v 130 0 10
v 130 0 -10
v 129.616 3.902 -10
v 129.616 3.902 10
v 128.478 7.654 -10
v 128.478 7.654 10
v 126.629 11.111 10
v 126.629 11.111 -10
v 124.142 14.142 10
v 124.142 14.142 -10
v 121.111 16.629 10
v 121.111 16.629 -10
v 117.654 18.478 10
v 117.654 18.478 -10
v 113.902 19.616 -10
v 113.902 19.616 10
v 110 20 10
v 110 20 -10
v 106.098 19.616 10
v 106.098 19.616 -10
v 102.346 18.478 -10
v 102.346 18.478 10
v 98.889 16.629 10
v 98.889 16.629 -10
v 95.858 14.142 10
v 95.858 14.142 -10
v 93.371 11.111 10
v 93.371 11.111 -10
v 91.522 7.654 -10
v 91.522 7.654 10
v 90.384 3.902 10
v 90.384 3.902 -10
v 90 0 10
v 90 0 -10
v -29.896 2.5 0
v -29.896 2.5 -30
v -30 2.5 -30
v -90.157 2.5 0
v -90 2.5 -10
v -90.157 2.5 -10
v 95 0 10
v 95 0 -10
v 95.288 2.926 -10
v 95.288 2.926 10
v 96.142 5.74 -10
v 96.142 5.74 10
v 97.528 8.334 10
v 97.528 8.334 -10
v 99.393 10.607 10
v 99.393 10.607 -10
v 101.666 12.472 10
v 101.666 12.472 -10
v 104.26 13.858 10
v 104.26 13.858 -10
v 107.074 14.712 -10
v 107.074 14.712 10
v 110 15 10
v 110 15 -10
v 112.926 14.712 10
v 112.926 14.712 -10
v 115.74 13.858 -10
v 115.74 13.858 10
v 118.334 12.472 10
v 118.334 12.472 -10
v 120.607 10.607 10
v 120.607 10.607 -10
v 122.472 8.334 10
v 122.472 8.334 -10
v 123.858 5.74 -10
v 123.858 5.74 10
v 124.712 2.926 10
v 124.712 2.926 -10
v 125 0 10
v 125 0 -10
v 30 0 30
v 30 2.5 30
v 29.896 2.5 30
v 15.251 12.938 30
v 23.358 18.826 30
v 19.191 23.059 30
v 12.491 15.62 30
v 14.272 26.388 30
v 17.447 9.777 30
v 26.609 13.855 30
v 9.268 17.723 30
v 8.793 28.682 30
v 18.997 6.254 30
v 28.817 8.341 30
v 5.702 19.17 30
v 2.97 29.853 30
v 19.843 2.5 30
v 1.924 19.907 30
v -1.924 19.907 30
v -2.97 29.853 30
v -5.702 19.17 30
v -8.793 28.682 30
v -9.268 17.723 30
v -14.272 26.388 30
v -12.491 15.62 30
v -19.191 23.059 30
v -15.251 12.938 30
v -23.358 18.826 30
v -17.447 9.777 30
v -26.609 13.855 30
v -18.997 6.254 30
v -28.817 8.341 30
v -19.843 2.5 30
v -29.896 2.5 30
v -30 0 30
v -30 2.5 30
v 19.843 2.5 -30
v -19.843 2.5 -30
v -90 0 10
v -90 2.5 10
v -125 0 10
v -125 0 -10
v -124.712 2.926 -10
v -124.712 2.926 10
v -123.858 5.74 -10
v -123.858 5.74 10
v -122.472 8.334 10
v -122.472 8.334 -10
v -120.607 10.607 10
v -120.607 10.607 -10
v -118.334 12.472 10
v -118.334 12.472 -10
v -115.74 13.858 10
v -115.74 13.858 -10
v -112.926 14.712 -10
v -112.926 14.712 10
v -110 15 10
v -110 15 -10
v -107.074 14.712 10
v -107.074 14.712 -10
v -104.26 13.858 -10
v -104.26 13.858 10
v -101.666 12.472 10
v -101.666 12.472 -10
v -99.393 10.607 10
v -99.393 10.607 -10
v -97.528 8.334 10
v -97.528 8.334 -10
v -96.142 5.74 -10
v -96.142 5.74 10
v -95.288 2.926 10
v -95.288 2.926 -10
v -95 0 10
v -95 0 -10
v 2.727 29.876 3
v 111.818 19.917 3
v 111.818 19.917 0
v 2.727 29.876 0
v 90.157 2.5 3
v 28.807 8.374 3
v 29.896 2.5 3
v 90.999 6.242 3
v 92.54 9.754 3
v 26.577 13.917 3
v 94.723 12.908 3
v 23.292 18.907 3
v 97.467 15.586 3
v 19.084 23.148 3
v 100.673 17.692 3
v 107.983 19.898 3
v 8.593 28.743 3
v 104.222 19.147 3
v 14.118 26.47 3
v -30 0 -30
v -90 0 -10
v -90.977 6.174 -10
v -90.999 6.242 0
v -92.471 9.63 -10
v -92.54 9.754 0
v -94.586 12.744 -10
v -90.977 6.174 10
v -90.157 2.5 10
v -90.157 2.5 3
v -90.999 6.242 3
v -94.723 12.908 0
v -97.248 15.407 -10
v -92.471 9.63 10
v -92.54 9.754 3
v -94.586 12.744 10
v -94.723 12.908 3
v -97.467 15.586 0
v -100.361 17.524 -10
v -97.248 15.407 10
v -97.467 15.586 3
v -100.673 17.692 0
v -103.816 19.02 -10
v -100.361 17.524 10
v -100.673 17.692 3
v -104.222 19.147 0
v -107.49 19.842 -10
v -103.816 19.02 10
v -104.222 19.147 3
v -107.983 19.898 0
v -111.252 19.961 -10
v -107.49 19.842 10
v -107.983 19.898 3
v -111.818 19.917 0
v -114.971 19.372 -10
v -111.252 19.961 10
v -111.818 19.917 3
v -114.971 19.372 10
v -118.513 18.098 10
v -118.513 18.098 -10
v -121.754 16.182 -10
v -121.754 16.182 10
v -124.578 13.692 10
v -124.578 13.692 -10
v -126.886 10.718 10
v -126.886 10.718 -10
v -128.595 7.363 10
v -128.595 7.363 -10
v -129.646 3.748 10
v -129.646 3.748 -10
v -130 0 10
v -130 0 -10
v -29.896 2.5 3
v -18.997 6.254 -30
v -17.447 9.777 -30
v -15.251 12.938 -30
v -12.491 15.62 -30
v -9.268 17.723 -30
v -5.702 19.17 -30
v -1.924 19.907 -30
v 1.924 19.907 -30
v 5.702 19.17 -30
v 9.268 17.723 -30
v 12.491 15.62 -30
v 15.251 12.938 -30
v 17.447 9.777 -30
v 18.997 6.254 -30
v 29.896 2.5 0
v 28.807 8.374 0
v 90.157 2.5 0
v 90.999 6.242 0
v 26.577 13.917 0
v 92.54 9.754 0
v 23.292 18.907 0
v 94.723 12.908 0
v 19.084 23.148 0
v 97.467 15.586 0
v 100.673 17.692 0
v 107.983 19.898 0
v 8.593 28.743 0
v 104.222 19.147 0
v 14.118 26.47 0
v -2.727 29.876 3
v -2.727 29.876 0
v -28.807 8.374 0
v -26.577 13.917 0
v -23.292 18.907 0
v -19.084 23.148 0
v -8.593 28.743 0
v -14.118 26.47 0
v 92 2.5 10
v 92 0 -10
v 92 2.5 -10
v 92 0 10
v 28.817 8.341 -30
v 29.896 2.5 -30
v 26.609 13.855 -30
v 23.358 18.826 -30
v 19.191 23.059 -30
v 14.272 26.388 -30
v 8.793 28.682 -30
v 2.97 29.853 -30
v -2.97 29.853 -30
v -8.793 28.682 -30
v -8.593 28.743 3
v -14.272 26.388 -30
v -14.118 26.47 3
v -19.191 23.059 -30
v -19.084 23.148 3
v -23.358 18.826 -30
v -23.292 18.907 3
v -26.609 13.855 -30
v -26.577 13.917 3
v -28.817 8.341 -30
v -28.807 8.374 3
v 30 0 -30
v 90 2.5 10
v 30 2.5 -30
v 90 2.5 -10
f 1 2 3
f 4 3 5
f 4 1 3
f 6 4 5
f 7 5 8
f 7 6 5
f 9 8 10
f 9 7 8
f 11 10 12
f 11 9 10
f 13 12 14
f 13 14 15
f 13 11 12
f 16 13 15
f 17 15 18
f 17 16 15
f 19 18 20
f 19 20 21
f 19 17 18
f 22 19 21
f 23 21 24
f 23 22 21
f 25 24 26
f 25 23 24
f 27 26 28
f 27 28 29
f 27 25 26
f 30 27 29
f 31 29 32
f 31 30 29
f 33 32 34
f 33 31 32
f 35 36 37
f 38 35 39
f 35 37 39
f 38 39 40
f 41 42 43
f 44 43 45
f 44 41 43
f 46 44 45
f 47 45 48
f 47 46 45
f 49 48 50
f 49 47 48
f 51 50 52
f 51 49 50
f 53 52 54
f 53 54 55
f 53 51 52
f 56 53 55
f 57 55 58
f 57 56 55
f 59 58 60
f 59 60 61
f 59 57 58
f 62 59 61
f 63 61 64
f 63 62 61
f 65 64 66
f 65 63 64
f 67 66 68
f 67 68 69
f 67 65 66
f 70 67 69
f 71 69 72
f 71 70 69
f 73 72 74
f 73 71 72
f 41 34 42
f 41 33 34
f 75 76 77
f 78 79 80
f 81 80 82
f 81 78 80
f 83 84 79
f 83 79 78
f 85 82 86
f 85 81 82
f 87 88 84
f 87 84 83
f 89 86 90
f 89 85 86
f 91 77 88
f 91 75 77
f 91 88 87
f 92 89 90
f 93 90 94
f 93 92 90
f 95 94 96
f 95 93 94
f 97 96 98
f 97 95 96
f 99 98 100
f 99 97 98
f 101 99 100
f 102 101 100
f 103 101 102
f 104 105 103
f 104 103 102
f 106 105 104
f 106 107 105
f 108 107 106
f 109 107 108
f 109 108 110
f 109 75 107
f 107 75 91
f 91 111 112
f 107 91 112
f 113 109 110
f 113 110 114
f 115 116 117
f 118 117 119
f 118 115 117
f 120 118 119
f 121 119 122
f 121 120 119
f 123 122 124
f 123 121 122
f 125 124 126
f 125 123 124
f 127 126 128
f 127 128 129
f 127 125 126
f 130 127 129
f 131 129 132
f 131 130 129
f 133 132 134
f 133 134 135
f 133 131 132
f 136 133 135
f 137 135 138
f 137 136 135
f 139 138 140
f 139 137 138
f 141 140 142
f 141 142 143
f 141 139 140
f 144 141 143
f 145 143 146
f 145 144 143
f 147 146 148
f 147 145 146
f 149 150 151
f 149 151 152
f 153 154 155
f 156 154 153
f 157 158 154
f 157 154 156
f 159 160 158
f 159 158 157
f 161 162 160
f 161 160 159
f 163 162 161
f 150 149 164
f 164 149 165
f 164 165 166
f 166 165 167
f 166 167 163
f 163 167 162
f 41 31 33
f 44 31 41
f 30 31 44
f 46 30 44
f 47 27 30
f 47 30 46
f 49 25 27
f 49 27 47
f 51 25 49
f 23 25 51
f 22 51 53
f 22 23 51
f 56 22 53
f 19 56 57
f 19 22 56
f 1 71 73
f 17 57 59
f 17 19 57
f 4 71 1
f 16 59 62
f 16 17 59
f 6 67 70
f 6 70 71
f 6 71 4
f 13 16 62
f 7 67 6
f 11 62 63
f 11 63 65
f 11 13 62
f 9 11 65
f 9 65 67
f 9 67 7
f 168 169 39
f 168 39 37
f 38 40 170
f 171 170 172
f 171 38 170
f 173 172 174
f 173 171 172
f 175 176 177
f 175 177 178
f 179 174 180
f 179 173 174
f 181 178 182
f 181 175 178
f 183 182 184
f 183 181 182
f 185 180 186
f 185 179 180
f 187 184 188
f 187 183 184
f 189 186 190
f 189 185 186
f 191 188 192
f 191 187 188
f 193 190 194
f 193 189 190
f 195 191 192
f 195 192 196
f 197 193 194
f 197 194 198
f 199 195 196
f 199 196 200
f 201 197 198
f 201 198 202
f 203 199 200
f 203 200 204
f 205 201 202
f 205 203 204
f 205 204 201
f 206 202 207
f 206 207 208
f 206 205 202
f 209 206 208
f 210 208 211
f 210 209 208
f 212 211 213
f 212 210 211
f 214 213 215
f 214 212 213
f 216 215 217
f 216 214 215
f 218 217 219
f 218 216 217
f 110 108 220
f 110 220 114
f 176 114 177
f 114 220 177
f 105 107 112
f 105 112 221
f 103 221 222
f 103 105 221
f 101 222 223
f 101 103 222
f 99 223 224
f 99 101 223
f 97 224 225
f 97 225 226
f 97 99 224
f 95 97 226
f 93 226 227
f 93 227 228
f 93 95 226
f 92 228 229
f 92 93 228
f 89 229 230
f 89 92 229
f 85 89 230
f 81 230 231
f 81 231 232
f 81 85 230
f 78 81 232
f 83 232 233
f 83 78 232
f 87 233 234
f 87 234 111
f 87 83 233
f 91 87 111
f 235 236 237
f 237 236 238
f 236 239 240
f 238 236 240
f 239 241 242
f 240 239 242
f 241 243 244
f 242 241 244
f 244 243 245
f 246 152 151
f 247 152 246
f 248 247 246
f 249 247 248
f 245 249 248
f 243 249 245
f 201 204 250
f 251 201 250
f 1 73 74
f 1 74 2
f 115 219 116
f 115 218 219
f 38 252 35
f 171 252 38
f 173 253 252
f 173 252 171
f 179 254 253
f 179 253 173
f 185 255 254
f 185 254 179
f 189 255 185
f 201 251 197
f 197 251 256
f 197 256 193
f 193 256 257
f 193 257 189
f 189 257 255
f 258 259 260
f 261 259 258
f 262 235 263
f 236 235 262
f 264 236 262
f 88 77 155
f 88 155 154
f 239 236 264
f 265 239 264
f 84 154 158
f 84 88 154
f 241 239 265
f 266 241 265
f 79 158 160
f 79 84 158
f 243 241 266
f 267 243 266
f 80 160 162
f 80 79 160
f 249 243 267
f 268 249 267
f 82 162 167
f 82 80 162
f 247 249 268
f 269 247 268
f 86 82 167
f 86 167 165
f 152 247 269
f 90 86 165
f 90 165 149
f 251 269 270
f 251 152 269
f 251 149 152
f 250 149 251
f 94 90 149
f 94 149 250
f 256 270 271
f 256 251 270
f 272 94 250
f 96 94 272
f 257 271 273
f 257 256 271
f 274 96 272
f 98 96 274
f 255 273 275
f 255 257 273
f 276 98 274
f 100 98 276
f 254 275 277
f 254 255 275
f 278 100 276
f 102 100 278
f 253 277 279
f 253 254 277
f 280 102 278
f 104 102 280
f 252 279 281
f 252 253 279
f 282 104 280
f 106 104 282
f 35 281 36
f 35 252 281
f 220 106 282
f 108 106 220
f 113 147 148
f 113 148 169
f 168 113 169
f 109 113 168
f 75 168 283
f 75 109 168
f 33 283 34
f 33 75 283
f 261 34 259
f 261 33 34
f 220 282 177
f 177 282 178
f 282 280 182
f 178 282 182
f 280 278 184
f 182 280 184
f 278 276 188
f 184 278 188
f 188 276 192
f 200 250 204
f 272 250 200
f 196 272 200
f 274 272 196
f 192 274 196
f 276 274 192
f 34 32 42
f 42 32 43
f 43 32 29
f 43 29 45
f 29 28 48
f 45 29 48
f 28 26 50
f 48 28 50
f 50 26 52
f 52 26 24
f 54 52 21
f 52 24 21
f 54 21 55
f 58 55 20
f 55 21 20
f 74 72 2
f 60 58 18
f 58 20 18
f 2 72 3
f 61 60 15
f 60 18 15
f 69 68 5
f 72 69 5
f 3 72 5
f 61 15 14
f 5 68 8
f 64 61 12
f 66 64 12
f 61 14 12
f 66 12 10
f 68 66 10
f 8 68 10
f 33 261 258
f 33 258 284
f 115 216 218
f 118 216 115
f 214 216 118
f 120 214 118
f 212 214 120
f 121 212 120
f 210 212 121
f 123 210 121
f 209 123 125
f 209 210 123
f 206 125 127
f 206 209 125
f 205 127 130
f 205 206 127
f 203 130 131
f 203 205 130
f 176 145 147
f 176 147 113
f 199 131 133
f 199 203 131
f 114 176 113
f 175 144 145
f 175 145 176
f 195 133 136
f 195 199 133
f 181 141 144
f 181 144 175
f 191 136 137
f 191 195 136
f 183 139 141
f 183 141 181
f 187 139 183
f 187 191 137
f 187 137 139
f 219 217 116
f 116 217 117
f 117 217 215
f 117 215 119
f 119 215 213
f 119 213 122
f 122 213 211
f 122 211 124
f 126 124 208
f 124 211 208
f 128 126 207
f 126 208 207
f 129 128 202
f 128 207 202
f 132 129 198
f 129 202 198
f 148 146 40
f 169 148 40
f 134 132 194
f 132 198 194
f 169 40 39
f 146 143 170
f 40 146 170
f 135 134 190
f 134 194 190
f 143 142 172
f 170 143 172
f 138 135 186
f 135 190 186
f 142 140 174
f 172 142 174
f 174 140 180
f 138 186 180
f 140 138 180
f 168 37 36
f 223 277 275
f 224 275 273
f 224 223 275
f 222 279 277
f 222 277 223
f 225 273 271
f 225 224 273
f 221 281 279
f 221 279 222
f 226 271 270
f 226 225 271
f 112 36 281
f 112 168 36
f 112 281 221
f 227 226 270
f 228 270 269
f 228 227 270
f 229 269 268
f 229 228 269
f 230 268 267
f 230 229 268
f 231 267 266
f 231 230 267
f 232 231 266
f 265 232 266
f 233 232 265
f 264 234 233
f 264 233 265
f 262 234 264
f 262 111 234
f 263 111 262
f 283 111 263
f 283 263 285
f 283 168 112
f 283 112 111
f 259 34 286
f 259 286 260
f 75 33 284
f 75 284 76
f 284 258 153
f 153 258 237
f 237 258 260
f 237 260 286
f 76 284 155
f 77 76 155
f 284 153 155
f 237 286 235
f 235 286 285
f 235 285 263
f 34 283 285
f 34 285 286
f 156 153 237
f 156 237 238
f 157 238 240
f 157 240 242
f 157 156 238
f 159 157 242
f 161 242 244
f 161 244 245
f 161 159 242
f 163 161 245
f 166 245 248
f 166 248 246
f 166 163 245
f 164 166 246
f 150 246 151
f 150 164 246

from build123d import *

# Parameters (mm, degrees)
BOSS_EXTRUDE1_DEPTH = 30
BOSS_EXTRUDE2_DEPTH = 10
BOSS_EXTRUDE3_DEPTH = 10
BOSS_EXTRUDE4_DEPTH = 2.5
BOSS_EXTRUDE5_START = 3
BOSS_EXTRUDE5_DEPTH = 3


with BuildPart() as part:
    # Sketch1 → Boss-Extrude1 (new, symmetric)
    with BuildSketch(Plane.XY):
        with BuildLine():
            Line((20, 0), (30, 0))
            ThreePointArc((30, 0), (0, 30), (-30, 0))
            Line((-30, 0), (-20, 0))
            ThreePointArc((-20, 0), (0, 20), (20, 0))
        make_face()
    extrude(amount=BOSS_EXTRUDE1_DEPTH, both=True)

    # Sketch4 → Boss-Extrude4 (add)
    with BuildSketch(Plane(origin=(0, 0, 0), x_dir=(1, 0, 0), z_dir=(0, 1, 0))):
        Polygon((-90, 10), (-30, 30), (30, 30), (90, 10), (92, 10), (92, -10), (90, -10), (30, -30), (-30, -30), (-90, -10), (-92, -10), (-92, 10), align=None)
    extrude(amount=BOSS_EXTRUDE4_DEPTH)



with BuildPart() as body_2:
    # Sketch1<3> → Boss-Extrude2 (new, symmetric)
    with BuildSketch(Plane.XY):
        with BuildLine():
            Line((-130, 0), (-125, 0))
            ThreePointArc((-125, 0), (-110, 15), (-95, 0))
            Line((-95, 0), (-90, 0))
            ThreePointArc((-90, 0), (-110, 20), (-130, 0))
        make_face()
    extrude(amount=BOSS_EXTRUDE2_DEPTH, both=True)


with BuildPart() as body_3:
    # Sketch1<4> → Boss-Extrude3 (new, symmetric)
    with BuildSketch(Plane.XY):
        with BuildLine():
            Line((90, 0), (95, 0))
            ThreePointArc((95, 0), (110, 15), (125, 0))
            Line((125, 0), (130, 0))
            ThreePointArc((130, 0), (110, 20), (90, 0))
        make_face()
    extrude(amount=BOSS_EXTRUDE3_DEPTH, both=True)


with BuildPart() as part_1:
    add(part.part)

    add(body_2.part)  # Boss-Extrude5 merges body 2
    # Sketch7 → Boss-Extrude5 (add)
    with BuildSketch(Plane.XY.offset(BOSS_EXTRUDE5_START)):
        with BuildLine():
            Line((-111.818181818, 19.917183909), (-2.727272727, 29.875775864))
            ThreePointArc((-2.727272727, 29.875775864), (-22.156468376, 20.225995874), (-30, 0))
            Line((-30, 0), (-90, 0))
            ThreePointArc((-90, 0), (-96.516002751, 14.770978918), (-111.818181818, 19.917183909))
        make_face()
    boss_extrude5 = extrude(amount=-BOSS_EXTRUDE5_DEPTH)

    # Mirror1: Boss-Extrude5 across plane
    add(boss_extrude5.mirror(Plane(origin=(0, 0, 0), x_dir=(0, 0, 1), z_dir=(1, 0, 0))))


solid = Compound([body_3.part, part_1.part])
